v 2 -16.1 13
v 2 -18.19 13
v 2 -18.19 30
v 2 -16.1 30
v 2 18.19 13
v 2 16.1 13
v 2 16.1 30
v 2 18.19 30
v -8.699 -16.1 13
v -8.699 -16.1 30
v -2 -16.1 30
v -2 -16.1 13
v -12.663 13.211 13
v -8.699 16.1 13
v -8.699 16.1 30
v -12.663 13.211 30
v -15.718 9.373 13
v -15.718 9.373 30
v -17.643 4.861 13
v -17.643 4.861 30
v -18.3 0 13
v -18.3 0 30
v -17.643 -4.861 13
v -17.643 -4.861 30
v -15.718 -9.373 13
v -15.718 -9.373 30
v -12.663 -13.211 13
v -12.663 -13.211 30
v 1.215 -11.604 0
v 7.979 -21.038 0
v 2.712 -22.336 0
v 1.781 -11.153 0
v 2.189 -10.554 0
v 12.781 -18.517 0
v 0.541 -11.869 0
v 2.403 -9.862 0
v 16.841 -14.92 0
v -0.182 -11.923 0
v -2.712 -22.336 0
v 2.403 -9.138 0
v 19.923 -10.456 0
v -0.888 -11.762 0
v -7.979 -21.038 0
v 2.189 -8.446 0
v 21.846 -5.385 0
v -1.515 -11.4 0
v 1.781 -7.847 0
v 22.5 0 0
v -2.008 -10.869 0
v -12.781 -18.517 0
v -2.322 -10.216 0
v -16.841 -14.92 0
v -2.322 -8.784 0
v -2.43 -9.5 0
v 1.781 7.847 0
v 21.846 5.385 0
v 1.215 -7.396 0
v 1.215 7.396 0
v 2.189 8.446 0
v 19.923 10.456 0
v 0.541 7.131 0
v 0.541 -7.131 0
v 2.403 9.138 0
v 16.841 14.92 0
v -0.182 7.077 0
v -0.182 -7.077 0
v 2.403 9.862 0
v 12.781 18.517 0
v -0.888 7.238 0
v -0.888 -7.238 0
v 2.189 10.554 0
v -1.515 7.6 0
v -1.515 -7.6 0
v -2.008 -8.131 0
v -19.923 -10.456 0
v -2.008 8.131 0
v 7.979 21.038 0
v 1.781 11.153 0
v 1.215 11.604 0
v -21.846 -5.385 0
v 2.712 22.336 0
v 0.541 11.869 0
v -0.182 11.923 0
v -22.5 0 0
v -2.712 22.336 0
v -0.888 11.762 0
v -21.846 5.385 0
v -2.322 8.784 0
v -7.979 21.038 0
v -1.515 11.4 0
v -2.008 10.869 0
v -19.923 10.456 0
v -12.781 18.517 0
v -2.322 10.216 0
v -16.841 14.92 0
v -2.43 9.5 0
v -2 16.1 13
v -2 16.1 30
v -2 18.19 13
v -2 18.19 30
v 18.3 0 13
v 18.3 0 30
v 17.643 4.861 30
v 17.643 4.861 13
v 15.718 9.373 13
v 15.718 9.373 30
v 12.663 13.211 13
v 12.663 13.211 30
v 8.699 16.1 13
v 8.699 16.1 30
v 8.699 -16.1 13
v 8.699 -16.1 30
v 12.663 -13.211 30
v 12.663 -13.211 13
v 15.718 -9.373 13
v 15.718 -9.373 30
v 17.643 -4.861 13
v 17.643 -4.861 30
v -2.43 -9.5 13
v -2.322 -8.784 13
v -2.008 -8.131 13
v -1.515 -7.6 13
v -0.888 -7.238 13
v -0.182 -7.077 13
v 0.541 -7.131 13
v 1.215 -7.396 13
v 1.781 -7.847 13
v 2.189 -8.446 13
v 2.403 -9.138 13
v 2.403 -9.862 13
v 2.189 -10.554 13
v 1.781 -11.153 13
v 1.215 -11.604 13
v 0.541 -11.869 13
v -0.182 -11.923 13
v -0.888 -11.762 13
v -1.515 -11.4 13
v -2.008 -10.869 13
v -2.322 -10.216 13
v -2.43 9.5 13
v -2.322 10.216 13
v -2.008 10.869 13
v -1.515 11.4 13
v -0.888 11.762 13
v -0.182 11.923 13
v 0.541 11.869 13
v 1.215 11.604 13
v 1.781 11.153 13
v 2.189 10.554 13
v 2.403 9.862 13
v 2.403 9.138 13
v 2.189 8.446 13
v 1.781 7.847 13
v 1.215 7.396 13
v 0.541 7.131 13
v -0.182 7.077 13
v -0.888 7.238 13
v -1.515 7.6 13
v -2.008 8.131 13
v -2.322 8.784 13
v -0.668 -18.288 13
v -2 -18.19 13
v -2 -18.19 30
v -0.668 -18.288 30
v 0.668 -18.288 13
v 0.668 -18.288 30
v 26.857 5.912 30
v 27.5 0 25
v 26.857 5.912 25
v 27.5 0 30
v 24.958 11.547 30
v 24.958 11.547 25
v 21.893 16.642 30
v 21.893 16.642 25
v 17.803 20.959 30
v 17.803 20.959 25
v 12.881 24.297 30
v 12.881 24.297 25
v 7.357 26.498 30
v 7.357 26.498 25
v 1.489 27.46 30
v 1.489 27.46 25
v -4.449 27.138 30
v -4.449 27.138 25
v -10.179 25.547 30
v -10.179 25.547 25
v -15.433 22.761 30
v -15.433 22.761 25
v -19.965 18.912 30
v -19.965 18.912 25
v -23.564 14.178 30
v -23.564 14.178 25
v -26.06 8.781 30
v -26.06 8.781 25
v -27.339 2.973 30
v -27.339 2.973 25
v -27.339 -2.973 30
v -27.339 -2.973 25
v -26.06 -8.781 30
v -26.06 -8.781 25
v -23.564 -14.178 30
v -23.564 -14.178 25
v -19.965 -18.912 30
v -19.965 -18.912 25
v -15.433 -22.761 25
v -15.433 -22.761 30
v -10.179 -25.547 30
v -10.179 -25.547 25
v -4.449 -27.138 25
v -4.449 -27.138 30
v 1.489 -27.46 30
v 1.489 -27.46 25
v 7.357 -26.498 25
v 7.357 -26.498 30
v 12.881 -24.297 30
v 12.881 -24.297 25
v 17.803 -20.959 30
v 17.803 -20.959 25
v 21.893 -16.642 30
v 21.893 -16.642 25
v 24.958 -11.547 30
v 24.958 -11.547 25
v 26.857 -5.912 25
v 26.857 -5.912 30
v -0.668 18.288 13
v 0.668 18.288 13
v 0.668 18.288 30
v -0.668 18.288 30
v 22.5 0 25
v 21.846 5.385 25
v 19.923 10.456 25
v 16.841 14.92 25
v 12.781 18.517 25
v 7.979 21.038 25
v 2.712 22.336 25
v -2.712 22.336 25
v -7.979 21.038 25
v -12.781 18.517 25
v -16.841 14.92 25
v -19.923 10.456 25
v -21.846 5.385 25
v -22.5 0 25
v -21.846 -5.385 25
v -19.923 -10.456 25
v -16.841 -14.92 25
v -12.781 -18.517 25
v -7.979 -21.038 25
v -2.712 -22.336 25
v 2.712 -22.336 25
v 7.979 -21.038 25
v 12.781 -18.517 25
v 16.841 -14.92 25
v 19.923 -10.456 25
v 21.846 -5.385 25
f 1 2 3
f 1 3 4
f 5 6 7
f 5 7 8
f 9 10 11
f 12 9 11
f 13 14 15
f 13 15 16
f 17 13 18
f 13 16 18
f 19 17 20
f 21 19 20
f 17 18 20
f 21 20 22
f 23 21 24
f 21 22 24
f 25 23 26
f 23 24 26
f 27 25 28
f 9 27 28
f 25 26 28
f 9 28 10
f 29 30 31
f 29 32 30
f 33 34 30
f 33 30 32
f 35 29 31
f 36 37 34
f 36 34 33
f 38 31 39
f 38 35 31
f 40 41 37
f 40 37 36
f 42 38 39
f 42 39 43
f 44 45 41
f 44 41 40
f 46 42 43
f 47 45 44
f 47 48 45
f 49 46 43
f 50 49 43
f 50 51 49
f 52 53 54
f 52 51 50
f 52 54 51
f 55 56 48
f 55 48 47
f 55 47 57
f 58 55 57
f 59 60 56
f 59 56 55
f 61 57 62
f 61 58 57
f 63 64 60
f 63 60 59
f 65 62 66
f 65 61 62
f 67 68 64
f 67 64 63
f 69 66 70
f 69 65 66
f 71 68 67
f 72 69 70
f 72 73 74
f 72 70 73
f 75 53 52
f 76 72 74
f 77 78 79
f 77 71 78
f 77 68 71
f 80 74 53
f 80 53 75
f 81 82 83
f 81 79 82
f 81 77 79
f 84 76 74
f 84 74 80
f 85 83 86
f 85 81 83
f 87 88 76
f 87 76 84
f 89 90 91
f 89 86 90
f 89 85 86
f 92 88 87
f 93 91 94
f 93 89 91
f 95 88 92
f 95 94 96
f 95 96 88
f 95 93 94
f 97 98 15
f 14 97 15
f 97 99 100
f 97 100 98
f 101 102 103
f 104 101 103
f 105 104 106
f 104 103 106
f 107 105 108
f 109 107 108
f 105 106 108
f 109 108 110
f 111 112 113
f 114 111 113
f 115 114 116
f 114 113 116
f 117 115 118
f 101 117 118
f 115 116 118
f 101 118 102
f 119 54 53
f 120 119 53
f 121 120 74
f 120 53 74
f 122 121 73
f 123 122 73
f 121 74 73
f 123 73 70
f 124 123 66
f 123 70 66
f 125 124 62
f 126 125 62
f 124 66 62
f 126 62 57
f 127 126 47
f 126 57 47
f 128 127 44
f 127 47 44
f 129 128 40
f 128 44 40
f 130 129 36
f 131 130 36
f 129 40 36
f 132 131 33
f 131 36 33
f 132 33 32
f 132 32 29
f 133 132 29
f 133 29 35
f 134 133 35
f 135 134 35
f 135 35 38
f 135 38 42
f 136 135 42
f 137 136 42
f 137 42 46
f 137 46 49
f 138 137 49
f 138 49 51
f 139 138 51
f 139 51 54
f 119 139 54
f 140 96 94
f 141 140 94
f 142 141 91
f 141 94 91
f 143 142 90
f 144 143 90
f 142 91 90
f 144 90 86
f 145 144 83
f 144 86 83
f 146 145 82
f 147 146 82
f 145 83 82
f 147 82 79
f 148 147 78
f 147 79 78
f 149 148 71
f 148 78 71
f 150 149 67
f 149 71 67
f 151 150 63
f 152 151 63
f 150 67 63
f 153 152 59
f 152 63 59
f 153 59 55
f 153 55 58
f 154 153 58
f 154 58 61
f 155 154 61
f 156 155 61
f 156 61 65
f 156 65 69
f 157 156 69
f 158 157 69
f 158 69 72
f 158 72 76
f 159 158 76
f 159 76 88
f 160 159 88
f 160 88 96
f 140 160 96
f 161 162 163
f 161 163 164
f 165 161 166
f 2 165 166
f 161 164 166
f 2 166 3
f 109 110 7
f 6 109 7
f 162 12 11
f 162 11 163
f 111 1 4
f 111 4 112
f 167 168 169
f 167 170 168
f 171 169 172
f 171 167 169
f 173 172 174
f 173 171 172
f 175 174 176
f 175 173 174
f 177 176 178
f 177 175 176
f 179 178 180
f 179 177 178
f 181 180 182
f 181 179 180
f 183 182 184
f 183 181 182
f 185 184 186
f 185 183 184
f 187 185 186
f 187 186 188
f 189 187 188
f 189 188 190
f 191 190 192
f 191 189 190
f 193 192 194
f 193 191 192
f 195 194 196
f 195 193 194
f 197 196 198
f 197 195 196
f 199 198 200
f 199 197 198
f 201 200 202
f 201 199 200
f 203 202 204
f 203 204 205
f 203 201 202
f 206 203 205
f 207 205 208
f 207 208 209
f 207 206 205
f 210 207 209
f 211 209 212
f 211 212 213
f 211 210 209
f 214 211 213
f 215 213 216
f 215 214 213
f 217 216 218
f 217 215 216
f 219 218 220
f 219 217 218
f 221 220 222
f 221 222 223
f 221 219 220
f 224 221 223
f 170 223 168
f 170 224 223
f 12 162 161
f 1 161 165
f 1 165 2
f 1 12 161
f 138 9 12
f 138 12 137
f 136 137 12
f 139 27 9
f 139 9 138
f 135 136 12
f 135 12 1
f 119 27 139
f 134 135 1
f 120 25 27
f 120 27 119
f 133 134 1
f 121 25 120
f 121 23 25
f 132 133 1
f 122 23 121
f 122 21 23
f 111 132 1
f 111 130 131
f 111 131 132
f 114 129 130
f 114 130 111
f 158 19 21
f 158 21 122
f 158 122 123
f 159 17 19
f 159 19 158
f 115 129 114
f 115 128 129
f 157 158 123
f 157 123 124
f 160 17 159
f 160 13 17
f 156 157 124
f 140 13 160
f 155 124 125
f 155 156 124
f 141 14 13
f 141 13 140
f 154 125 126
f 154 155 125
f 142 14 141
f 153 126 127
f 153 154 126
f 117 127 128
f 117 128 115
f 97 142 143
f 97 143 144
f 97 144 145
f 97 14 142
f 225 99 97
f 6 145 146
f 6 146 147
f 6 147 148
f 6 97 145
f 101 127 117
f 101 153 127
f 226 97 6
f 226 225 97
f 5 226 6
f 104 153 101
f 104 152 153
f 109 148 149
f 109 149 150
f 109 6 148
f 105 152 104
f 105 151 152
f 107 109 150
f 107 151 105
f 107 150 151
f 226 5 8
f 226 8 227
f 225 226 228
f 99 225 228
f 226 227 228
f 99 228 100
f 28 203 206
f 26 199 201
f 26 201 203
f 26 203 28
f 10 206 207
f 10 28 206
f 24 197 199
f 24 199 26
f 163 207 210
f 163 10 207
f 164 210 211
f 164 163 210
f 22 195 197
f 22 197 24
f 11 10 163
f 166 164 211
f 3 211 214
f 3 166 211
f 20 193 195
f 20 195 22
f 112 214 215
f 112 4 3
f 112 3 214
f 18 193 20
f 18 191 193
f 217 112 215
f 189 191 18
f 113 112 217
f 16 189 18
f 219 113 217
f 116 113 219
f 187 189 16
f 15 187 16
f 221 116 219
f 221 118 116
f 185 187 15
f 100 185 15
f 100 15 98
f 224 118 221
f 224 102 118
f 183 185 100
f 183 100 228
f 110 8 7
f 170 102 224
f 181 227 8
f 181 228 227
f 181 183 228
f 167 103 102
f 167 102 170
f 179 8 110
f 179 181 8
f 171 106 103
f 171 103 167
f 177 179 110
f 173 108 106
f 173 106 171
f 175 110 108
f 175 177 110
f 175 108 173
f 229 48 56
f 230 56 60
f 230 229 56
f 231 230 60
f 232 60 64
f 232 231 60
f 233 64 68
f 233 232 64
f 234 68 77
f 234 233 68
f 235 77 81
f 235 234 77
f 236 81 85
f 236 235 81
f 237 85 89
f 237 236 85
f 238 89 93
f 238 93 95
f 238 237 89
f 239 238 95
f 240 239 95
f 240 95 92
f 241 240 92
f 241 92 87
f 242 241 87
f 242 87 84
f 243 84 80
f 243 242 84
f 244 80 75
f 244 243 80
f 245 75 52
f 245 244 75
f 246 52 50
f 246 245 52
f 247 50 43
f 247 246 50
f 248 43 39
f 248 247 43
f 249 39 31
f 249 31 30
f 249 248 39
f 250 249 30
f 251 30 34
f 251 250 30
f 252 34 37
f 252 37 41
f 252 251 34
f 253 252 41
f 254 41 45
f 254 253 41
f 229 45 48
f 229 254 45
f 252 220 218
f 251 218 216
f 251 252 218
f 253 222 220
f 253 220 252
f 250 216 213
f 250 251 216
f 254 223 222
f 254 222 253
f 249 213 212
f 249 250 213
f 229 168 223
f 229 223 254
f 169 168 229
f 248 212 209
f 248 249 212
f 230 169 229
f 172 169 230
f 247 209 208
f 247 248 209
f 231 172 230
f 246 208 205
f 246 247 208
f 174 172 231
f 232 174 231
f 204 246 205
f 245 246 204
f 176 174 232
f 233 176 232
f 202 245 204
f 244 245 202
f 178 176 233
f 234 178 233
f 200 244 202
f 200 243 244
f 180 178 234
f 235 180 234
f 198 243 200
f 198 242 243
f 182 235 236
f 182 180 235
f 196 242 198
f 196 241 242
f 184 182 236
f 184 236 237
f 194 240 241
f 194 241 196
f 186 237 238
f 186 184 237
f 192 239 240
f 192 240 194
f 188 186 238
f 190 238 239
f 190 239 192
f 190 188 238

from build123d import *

# Parameters (mm, degrees)
F3_DEPTH = 17
F4_D     = 4.86


with BuildPart() as f1:
    # F0 (on Front) → F1 (revolve)
    with BuildSketch(Plane.XZ):
        Polygon((0, 30), (0, 0), (22.5, 0), (22.5, 25), (27.5, 25), (27.5, 30), align=None)
    revolve(axis=Axis((0, 0, 15), (0, 0, 1)))

    # F2 (on face) → F3 (cut)
    with BuildSketch(Plane.XY.offset(30)):
        with BuildLine():
            Line((2, -16.1), (0, -16.1))
            Line((0, -16.1), (-2, -16.1))
            Line((-2, -16.1), (-2, -18.190382))
            ThreePointArc((-2, -18.190382), (0, -18.3), (2, -18.190382))
            Line((2, -18.190382), (2, -16.1))
        make_face()
        with BuildLine():
            Line((0, -9.5), (0, 0))
            Line((0, 0), (0, 9.5))
            Line((0, 9.5), (0, 16.1))
            Line((0, 16.1), (-2, 16.1))
            Line((-2, 16.1), (-8.699425, 16.1))
            ThreePointArc((-8.699425, 16.1), (-18.3, 0), (-8.699425, -16.1))
            Line((-8.699425, -16.1), (-2, -16.1))
            Line((-2, -16.1), (0, -16.1))
            Line((0, -16.1), (0, -9.5))
        make_face()
        with BuildLine():
            Line((-2, 16.1), (0, 16.1))
            Line((0, 16.1), (2, 16.1))
            Line((2, 16.1), (2, 18.190382))
            ThreePointArc((2, 18.190382), (0, 18.3), (-2, 18.190382))
            Line((-2, 18.190382), (-2, 16.1))
        make_face()
        with BuildLine():
            Line((0, 9.5), (0, 0))
            Line((0, 0), (10, 0))
            Line((10, 0), (18.3, 0))
            ThreePointArc((18.3, 0), (15.717657, 9.37258), (8.699425, 16.1))
            Line((8.699425, 16.1), (2, 16.1))
            Line((2, 16.1), (0, 16.1))
            Line((0, 16.1), (0, 9.5))
        make_face()
        with BuildLine():
            Line((10, 0), (0, 0))
            Line((0, 0), (0, -9.5))
            Line((0, -9.5), (0, -16.1))
            Line((0, -16.1), (2, -16.1))
            Line((2, -16.1), (8.699425, -16.1))
            ThreePointArc((8.699425, -16.1), (15.717657, -9.37258), (18.3, 0))
            Line((18.3, 0), (10, 0))
        make_face()
    extrude(amount=-F3_DEPTH, mode=Mode.SUBTRACT)

    # F4 (through all)
    with Locations(Plane.XY.offset(30)):
        with Locations((0, 9.5), (0, -9.5)):
            Hole(F4_D / 2)


solid = f1.part
